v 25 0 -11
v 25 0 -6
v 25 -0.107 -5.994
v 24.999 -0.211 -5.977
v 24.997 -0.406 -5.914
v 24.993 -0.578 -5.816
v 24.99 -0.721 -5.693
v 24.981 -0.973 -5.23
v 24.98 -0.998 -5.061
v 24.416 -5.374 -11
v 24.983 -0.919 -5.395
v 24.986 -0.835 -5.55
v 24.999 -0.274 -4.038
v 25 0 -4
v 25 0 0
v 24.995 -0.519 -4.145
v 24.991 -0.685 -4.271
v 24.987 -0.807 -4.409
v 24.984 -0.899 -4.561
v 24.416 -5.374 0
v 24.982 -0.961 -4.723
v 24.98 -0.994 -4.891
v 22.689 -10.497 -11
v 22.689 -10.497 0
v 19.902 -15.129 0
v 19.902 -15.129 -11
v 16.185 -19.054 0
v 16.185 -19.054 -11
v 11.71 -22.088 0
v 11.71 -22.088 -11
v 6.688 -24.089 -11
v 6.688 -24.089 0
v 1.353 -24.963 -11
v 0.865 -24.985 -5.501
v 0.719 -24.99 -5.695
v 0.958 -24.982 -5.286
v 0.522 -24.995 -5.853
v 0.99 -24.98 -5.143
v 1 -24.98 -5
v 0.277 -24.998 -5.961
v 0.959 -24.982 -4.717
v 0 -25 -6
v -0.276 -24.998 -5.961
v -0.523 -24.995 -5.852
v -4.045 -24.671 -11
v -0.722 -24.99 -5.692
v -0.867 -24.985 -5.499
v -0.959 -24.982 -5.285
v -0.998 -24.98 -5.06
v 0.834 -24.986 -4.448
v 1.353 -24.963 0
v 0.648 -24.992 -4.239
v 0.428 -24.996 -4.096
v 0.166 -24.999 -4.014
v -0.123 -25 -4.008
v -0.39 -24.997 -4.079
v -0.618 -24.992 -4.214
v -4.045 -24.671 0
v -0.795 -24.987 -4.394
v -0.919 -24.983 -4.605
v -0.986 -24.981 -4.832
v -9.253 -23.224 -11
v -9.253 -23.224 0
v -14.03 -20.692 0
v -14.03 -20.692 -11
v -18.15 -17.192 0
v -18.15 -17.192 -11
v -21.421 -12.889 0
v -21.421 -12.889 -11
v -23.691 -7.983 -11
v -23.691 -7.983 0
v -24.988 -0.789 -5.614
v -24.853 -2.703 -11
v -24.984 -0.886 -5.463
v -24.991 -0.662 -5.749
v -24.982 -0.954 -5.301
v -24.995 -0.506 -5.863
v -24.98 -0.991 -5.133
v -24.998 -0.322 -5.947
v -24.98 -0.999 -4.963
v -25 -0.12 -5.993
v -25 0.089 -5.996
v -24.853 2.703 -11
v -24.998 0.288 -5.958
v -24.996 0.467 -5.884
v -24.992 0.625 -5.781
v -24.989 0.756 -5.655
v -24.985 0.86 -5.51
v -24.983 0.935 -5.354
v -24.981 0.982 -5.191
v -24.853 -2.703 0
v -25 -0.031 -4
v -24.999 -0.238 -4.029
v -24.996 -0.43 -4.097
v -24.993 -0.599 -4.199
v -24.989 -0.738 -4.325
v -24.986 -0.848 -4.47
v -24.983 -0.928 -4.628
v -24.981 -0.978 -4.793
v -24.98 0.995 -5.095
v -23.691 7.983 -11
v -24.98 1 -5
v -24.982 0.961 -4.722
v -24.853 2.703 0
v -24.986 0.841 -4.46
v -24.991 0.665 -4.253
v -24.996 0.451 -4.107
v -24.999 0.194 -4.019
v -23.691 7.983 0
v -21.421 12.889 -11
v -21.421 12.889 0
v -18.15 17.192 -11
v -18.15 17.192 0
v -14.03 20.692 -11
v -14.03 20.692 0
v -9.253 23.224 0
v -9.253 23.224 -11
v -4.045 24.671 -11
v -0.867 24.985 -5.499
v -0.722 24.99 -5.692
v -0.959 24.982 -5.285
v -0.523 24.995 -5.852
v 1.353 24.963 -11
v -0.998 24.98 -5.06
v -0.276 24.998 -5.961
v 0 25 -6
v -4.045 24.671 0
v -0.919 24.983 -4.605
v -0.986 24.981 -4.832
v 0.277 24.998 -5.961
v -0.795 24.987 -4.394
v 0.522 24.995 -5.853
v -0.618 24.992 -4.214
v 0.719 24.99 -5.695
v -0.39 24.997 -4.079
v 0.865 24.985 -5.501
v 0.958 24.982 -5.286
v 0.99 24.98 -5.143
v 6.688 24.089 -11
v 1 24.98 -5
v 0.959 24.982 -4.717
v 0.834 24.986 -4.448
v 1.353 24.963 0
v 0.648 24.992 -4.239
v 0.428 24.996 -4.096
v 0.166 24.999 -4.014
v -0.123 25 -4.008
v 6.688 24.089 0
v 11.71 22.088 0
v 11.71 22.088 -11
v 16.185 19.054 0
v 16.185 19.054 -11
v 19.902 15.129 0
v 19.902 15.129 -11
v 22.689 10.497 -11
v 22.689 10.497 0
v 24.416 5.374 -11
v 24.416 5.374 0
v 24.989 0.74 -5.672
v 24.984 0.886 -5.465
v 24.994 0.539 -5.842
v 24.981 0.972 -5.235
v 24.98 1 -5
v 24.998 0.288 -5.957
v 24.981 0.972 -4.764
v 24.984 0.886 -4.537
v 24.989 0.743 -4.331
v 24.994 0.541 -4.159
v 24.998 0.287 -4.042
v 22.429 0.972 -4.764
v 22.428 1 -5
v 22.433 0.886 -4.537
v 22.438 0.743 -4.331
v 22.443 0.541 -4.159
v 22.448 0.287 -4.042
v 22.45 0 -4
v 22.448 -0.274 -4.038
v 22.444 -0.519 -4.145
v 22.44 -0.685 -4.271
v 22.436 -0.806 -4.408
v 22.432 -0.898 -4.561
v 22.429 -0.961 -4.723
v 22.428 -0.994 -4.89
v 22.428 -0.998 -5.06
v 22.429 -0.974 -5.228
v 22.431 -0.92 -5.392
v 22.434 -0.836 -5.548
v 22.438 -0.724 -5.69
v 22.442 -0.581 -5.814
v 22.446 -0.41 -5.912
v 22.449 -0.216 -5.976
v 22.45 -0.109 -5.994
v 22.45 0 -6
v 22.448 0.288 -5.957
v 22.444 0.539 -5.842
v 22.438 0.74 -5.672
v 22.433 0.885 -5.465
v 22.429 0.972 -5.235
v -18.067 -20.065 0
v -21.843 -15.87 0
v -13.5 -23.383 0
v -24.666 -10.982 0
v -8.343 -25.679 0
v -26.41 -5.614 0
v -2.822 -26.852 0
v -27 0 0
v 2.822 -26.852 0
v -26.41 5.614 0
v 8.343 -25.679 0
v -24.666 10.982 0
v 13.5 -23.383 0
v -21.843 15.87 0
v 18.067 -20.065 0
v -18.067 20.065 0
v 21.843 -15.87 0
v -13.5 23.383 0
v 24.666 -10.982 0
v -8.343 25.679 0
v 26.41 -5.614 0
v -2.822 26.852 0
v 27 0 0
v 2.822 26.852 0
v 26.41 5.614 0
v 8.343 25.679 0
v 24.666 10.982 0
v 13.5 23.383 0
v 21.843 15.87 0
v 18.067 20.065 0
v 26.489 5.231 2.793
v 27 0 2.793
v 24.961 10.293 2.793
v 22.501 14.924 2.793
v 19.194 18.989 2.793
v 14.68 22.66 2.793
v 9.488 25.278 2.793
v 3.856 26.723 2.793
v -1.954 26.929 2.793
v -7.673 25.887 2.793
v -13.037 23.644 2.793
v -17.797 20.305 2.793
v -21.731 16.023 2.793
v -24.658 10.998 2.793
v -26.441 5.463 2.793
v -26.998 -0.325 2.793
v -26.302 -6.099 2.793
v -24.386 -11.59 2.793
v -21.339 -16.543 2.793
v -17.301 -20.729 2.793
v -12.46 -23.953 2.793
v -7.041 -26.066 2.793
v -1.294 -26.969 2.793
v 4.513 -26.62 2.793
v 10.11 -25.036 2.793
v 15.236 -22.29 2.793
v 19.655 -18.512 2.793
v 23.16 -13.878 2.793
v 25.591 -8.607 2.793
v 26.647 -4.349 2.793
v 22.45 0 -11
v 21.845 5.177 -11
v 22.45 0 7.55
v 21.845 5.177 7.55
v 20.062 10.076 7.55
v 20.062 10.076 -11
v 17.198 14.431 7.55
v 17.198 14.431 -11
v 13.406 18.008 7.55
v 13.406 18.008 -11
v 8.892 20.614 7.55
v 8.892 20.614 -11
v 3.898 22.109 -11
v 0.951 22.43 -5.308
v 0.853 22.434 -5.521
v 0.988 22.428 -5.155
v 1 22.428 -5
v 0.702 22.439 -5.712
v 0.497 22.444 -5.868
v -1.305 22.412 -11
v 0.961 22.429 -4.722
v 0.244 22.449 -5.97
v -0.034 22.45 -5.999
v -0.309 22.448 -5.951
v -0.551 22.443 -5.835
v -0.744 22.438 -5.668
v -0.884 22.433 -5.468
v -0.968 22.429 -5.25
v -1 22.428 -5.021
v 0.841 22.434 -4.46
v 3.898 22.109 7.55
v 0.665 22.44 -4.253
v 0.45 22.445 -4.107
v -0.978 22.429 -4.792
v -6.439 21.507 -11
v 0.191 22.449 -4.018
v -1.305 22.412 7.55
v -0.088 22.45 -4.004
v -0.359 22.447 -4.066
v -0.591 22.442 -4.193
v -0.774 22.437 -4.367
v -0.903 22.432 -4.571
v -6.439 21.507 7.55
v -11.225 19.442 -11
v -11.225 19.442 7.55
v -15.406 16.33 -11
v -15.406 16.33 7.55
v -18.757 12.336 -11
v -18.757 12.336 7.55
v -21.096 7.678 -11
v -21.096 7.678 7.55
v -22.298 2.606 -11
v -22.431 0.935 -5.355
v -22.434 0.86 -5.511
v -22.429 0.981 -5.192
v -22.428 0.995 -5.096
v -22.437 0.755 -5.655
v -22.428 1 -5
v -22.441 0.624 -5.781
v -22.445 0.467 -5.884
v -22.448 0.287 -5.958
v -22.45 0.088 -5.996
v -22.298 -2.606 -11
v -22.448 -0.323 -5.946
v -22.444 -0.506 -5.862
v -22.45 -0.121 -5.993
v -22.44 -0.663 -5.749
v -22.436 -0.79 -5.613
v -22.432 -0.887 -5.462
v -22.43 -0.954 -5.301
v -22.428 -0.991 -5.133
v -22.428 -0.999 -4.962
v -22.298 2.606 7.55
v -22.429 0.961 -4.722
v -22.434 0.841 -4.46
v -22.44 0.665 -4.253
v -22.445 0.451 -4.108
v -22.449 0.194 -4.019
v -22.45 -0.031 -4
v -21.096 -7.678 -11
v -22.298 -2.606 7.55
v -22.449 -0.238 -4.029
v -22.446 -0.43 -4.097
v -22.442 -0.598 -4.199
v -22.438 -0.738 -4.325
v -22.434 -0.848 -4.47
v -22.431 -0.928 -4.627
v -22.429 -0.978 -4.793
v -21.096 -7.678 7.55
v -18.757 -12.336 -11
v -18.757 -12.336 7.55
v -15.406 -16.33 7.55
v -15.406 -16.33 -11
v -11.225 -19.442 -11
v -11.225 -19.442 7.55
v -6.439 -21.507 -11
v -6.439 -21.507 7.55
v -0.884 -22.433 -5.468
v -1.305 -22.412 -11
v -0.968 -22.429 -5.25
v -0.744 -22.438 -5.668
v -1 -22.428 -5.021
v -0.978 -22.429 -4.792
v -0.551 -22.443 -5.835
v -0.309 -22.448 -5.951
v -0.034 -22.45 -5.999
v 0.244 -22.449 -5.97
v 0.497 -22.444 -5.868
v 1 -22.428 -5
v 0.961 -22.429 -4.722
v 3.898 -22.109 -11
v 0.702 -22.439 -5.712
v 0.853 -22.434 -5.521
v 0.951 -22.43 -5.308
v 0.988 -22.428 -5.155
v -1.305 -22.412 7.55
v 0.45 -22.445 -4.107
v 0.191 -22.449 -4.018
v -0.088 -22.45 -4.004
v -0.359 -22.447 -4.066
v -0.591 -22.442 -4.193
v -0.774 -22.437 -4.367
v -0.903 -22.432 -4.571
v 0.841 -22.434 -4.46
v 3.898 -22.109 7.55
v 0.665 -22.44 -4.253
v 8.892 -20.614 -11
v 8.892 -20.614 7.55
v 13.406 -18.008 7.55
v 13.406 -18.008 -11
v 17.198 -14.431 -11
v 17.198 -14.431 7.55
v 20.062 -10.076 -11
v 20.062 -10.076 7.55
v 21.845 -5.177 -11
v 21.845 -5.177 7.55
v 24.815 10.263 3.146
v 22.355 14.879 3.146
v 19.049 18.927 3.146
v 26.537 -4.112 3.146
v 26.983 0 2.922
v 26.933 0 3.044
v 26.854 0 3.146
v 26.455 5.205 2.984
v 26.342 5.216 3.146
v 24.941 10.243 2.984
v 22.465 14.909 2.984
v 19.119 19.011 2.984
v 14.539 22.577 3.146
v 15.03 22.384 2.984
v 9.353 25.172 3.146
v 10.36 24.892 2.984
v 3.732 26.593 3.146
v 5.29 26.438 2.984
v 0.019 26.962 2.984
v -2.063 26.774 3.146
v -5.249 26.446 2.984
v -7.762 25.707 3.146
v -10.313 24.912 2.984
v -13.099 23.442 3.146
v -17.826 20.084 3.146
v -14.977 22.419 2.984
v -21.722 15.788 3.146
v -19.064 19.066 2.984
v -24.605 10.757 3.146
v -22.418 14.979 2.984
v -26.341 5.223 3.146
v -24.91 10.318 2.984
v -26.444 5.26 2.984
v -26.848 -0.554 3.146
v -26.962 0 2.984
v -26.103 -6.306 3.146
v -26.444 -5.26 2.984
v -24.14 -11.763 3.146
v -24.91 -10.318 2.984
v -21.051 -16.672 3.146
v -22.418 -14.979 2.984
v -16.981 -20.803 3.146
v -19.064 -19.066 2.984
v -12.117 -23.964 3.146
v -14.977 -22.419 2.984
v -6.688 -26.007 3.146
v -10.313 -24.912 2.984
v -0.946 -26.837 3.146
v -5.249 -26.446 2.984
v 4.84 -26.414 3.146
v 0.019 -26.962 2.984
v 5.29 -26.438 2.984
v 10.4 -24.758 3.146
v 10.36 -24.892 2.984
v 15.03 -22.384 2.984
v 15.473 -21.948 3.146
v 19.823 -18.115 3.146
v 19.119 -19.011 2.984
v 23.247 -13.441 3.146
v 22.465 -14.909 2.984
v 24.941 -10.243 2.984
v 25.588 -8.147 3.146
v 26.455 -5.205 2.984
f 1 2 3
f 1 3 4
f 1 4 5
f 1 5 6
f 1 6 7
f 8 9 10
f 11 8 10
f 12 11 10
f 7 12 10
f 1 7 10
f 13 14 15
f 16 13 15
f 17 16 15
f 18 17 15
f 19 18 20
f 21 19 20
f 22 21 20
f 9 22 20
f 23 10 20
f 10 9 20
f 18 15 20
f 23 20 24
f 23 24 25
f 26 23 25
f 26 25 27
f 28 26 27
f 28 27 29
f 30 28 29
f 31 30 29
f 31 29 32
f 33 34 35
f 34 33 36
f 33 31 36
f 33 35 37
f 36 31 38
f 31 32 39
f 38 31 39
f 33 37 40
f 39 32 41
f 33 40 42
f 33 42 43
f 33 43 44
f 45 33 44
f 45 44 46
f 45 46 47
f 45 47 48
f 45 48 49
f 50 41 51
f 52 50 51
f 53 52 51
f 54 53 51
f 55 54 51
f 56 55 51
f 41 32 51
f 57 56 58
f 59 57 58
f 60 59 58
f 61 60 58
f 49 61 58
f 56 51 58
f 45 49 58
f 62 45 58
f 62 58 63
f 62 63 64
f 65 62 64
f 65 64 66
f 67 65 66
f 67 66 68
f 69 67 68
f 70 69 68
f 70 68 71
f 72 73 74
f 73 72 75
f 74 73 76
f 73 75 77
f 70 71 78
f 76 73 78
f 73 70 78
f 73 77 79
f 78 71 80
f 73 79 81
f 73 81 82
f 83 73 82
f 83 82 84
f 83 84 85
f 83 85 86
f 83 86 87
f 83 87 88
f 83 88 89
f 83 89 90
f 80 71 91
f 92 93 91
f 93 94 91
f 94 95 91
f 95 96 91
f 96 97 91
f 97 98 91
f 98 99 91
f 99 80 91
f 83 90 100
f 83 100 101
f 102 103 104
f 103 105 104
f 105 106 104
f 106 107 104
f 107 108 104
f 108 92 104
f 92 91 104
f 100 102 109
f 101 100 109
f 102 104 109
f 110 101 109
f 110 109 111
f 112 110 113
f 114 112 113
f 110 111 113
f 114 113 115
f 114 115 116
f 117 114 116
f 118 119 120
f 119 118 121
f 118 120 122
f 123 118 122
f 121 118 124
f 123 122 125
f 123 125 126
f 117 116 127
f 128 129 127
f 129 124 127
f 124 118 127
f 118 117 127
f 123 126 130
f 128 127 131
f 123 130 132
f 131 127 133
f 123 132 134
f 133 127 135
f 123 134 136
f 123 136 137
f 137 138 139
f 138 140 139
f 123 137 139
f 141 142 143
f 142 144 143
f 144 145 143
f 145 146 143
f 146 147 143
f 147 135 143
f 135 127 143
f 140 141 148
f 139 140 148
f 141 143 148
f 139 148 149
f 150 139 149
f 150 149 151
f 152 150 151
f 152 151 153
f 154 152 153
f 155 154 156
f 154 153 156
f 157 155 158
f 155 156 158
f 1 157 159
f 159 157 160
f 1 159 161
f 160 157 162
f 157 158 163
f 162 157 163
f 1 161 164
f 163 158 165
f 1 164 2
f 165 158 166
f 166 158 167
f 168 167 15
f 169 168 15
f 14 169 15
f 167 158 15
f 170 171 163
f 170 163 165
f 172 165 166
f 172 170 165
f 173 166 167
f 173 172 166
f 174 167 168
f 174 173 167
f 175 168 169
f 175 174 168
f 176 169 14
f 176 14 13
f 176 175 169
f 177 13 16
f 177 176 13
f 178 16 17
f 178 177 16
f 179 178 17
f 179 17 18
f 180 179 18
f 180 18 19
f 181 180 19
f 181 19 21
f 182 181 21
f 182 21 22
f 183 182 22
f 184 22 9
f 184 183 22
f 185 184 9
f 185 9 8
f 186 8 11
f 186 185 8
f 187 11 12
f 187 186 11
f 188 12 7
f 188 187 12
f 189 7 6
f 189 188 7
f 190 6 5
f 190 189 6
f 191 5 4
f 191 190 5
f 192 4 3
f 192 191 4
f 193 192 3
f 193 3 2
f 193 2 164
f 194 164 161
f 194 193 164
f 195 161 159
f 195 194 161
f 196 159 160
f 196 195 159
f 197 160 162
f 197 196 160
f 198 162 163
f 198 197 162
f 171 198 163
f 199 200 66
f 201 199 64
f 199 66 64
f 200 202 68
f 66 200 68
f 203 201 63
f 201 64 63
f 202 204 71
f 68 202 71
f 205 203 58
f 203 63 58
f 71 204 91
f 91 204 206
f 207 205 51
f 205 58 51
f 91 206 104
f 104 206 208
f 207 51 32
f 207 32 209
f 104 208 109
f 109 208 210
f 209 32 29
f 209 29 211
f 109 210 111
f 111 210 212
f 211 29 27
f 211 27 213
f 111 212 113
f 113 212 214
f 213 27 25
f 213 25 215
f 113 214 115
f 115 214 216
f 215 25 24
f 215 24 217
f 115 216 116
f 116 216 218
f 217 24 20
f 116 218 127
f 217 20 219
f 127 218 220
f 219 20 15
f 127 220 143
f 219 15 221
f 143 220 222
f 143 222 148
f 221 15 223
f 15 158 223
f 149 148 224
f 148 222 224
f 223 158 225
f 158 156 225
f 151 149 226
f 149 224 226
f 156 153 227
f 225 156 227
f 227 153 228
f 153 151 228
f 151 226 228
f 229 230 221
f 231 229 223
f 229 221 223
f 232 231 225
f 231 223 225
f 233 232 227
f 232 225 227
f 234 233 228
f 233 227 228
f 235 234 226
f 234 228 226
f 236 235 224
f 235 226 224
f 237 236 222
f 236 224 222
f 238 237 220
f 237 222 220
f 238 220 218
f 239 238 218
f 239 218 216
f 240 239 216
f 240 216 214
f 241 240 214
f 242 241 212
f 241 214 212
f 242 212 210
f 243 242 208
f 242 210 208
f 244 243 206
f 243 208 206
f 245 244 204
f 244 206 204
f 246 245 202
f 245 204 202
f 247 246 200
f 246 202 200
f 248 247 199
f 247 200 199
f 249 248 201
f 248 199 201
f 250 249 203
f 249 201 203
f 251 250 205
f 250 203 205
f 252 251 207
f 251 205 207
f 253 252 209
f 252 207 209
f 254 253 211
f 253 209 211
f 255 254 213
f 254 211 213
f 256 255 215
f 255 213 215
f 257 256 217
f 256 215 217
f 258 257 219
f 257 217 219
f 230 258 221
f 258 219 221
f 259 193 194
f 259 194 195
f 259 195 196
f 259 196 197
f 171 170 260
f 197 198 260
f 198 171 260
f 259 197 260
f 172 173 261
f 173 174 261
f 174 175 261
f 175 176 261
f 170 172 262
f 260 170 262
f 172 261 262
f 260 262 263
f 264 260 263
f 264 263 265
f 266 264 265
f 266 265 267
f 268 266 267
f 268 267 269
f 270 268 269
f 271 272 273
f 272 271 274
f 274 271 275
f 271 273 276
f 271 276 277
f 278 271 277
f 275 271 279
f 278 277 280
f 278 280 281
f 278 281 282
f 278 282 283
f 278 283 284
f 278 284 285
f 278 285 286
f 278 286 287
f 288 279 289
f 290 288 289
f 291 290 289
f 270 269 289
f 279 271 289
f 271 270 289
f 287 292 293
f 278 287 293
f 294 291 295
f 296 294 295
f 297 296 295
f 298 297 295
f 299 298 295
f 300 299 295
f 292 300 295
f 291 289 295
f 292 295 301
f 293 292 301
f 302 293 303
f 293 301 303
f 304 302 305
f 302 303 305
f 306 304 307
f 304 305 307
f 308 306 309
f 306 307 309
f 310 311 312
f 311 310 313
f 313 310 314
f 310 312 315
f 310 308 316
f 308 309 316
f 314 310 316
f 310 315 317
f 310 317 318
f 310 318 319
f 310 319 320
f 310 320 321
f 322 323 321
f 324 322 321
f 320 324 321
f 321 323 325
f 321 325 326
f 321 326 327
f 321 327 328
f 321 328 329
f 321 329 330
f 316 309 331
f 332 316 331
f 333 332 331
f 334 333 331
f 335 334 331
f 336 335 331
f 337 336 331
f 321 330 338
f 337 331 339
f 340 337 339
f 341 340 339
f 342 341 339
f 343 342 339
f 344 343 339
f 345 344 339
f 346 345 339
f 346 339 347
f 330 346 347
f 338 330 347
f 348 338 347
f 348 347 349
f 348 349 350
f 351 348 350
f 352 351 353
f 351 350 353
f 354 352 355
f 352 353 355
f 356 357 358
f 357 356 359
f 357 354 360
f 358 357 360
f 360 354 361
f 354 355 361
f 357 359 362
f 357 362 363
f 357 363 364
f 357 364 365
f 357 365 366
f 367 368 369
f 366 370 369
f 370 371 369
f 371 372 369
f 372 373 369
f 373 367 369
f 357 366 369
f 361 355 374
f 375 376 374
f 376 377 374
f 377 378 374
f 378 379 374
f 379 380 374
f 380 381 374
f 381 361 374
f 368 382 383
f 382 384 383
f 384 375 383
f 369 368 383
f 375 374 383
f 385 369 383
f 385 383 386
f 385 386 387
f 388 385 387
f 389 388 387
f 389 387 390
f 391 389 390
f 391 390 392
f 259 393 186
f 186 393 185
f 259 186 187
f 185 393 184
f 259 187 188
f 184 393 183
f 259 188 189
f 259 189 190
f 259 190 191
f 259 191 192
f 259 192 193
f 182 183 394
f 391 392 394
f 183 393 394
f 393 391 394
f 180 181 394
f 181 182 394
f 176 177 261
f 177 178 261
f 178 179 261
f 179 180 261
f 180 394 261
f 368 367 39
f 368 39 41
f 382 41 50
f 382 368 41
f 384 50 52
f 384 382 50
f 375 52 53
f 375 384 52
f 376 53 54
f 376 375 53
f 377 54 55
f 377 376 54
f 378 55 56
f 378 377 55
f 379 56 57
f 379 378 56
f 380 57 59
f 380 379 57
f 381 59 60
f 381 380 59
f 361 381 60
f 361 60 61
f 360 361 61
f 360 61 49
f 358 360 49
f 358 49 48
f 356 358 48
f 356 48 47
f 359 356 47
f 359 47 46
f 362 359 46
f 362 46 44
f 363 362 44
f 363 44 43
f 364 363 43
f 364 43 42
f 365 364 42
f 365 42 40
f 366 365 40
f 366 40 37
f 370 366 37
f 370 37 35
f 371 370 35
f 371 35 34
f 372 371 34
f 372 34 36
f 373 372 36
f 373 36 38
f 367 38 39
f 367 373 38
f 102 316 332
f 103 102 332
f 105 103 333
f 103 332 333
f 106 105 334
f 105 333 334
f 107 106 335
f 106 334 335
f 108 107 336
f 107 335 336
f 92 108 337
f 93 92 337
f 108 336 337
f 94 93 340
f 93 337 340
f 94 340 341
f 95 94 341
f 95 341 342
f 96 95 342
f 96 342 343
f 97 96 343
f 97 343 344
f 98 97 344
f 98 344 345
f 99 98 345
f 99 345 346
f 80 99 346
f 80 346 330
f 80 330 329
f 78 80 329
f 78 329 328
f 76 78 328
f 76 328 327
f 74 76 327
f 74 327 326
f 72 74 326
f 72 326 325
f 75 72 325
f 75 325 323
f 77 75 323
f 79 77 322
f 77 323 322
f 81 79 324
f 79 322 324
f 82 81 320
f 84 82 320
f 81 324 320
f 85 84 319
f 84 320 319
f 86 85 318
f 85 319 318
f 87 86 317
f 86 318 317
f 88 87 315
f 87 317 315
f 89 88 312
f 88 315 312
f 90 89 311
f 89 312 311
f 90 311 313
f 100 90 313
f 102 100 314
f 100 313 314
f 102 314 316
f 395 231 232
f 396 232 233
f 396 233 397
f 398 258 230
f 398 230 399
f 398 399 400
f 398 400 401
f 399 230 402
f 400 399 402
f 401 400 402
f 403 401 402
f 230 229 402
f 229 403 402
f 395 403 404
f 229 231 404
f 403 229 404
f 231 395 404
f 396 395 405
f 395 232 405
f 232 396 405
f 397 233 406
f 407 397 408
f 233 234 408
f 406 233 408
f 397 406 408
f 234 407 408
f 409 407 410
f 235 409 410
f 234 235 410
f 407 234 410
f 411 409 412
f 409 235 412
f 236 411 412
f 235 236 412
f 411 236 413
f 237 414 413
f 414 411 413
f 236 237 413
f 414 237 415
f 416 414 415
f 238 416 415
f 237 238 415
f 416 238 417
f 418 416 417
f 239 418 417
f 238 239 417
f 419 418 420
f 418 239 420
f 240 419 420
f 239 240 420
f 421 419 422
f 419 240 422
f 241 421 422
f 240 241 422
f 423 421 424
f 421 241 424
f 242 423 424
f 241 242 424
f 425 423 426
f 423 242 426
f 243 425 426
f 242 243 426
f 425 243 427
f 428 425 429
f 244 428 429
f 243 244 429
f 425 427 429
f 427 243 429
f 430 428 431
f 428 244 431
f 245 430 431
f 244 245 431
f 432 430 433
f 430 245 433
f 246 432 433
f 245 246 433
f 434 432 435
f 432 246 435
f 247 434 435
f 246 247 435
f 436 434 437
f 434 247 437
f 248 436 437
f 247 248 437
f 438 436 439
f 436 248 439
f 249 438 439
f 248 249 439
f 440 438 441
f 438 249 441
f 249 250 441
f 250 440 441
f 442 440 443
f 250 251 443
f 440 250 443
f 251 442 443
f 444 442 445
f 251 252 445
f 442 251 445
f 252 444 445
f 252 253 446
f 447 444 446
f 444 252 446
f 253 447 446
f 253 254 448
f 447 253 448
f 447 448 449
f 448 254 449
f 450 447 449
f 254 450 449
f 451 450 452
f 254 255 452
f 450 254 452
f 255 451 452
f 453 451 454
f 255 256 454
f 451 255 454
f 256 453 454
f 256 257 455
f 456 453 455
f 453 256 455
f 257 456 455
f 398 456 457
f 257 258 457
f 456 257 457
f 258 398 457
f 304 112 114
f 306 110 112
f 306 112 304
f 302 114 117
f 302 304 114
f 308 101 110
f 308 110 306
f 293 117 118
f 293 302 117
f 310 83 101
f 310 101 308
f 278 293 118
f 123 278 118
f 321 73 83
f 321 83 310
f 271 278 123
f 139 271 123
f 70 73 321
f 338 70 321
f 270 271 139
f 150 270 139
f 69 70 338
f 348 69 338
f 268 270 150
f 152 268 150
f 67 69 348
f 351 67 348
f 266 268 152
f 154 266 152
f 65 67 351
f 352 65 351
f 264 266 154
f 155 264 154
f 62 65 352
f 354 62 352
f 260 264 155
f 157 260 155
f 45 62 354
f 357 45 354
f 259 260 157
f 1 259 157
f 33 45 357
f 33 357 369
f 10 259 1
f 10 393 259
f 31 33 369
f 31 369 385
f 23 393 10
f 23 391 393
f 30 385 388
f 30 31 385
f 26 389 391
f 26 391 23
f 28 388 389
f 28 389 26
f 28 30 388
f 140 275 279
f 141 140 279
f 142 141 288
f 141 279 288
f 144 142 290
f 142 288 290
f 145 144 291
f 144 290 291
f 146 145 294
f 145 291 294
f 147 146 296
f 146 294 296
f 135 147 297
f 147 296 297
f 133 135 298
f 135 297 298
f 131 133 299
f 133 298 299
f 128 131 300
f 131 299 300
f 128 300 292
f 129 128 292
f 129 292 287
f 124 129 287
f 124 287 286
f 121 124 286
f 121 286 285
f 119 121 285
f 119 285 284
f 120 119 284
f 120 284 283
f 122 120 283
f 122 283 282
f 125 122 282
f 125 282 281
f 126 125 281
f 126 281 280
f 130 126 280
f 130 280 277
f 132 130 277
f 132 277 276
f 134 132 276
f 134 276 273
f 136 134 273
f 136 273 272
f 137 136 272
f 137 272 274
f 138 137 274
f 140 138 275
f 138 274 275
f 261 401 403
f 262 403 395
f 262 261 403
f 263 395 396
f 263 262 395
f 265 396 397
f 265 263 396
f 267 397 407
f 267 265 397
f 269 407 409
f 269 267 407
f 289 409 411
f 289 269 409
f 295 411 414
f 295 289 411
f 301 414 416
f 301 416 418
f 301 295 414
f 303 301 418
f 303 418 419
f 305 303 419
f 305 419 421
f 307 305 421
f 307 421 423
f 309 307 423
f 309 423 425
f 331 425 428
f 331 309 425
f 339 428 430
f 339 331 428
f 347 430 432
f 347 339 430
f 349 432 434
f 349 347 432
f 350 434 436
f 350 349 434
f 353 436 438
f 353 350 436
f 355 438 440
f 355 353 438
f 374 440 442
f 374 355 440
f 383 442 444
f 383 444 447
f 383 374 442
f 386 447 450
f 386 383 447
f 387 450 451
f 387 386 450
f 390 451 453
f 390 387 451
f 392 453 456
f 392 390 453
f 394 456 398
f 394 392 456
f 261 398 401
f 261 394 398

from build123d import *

# Parameters (mm, degrees)
F0_R           = 27
F1_DEPTH       = 8
F2_SIZE        = 5
F3_R           = 0.5
F4_R           = 25
F5_DEPTH       = 11
F6_R           = 22.45
F7_DEPTH       = 19.001
F8_R           = 1
F9_DEPTH       = 27.0010008385
F9_DEPTH_BACK  = 27.0010008385
F10_R          = 1
F11_DEPTH      = 27.0010001
F11_DEPTH_BACK = 27.0010001


with BuildPart() as f1:
    # F0 (on Top) → F1 (new body)
    with BuildSketch(Plane.XY):
        Circle(F0_R)
    extrude(amount=F1_DEPTH)

    # F2
    f2_edges = [f1.edges().sort_by_distance(p)[0] for p in [
        (-27, 0, 8),
    ]]
    chamfer(f2_edges, length=F2_SIZE)

    # F3
    f3_edges = [f1.edges().sort_by_distance(p)[0] for p in [
        (-22, 0, 8),
        (-27, 0, 3),
    ]]
    fillet(f3_edges, radius=F3_R)

    # F4 (on face) → F5 (join)
    with BuildSketch(Plane(origin=(0, 0, 0), x_dir=(1, 0, 0), z_dir=(0, 0, -1))):
        Circle(F4_R)
    extrude(amount=F5_DEPTH)

    # F6 (on face) → F7 (cut, through all)
    with BuildSketch(Plane.XY.offset(8)):
        Circle(F6_R)
    extrude(amount=-F7_DEPTH, mode=Mode.SUBTRACT)

    # F8 (on Front) → F9 (cut, two sides)
    with BuildSketch(Plane.XZ) as f9_sk:
        with Locations((0, -5)):
            Circle(F8_R)
    extrude(amount=-F9_DEPTH, mode=Mode.SUBTRACT)
    extrude(f9_sk.sketch, amount=F9_DEPTH_BACK, mode=Mode.SUBTRACT)

    # F10 (on Right) → F11 (cut, two sides)
    with BuildSketch(Plane.YZ) as f11_sk:
        with Locations((0, -5)):
            Circle(F10_R)
    extrude(amount=F11_DEPTH, mode=Mode.SUBTRACT)
    extrude(f11_sk.sketch, amount=-F11_DEPTH_BACK, mode=Mode.SUBTRACT)


solid = f1.part
